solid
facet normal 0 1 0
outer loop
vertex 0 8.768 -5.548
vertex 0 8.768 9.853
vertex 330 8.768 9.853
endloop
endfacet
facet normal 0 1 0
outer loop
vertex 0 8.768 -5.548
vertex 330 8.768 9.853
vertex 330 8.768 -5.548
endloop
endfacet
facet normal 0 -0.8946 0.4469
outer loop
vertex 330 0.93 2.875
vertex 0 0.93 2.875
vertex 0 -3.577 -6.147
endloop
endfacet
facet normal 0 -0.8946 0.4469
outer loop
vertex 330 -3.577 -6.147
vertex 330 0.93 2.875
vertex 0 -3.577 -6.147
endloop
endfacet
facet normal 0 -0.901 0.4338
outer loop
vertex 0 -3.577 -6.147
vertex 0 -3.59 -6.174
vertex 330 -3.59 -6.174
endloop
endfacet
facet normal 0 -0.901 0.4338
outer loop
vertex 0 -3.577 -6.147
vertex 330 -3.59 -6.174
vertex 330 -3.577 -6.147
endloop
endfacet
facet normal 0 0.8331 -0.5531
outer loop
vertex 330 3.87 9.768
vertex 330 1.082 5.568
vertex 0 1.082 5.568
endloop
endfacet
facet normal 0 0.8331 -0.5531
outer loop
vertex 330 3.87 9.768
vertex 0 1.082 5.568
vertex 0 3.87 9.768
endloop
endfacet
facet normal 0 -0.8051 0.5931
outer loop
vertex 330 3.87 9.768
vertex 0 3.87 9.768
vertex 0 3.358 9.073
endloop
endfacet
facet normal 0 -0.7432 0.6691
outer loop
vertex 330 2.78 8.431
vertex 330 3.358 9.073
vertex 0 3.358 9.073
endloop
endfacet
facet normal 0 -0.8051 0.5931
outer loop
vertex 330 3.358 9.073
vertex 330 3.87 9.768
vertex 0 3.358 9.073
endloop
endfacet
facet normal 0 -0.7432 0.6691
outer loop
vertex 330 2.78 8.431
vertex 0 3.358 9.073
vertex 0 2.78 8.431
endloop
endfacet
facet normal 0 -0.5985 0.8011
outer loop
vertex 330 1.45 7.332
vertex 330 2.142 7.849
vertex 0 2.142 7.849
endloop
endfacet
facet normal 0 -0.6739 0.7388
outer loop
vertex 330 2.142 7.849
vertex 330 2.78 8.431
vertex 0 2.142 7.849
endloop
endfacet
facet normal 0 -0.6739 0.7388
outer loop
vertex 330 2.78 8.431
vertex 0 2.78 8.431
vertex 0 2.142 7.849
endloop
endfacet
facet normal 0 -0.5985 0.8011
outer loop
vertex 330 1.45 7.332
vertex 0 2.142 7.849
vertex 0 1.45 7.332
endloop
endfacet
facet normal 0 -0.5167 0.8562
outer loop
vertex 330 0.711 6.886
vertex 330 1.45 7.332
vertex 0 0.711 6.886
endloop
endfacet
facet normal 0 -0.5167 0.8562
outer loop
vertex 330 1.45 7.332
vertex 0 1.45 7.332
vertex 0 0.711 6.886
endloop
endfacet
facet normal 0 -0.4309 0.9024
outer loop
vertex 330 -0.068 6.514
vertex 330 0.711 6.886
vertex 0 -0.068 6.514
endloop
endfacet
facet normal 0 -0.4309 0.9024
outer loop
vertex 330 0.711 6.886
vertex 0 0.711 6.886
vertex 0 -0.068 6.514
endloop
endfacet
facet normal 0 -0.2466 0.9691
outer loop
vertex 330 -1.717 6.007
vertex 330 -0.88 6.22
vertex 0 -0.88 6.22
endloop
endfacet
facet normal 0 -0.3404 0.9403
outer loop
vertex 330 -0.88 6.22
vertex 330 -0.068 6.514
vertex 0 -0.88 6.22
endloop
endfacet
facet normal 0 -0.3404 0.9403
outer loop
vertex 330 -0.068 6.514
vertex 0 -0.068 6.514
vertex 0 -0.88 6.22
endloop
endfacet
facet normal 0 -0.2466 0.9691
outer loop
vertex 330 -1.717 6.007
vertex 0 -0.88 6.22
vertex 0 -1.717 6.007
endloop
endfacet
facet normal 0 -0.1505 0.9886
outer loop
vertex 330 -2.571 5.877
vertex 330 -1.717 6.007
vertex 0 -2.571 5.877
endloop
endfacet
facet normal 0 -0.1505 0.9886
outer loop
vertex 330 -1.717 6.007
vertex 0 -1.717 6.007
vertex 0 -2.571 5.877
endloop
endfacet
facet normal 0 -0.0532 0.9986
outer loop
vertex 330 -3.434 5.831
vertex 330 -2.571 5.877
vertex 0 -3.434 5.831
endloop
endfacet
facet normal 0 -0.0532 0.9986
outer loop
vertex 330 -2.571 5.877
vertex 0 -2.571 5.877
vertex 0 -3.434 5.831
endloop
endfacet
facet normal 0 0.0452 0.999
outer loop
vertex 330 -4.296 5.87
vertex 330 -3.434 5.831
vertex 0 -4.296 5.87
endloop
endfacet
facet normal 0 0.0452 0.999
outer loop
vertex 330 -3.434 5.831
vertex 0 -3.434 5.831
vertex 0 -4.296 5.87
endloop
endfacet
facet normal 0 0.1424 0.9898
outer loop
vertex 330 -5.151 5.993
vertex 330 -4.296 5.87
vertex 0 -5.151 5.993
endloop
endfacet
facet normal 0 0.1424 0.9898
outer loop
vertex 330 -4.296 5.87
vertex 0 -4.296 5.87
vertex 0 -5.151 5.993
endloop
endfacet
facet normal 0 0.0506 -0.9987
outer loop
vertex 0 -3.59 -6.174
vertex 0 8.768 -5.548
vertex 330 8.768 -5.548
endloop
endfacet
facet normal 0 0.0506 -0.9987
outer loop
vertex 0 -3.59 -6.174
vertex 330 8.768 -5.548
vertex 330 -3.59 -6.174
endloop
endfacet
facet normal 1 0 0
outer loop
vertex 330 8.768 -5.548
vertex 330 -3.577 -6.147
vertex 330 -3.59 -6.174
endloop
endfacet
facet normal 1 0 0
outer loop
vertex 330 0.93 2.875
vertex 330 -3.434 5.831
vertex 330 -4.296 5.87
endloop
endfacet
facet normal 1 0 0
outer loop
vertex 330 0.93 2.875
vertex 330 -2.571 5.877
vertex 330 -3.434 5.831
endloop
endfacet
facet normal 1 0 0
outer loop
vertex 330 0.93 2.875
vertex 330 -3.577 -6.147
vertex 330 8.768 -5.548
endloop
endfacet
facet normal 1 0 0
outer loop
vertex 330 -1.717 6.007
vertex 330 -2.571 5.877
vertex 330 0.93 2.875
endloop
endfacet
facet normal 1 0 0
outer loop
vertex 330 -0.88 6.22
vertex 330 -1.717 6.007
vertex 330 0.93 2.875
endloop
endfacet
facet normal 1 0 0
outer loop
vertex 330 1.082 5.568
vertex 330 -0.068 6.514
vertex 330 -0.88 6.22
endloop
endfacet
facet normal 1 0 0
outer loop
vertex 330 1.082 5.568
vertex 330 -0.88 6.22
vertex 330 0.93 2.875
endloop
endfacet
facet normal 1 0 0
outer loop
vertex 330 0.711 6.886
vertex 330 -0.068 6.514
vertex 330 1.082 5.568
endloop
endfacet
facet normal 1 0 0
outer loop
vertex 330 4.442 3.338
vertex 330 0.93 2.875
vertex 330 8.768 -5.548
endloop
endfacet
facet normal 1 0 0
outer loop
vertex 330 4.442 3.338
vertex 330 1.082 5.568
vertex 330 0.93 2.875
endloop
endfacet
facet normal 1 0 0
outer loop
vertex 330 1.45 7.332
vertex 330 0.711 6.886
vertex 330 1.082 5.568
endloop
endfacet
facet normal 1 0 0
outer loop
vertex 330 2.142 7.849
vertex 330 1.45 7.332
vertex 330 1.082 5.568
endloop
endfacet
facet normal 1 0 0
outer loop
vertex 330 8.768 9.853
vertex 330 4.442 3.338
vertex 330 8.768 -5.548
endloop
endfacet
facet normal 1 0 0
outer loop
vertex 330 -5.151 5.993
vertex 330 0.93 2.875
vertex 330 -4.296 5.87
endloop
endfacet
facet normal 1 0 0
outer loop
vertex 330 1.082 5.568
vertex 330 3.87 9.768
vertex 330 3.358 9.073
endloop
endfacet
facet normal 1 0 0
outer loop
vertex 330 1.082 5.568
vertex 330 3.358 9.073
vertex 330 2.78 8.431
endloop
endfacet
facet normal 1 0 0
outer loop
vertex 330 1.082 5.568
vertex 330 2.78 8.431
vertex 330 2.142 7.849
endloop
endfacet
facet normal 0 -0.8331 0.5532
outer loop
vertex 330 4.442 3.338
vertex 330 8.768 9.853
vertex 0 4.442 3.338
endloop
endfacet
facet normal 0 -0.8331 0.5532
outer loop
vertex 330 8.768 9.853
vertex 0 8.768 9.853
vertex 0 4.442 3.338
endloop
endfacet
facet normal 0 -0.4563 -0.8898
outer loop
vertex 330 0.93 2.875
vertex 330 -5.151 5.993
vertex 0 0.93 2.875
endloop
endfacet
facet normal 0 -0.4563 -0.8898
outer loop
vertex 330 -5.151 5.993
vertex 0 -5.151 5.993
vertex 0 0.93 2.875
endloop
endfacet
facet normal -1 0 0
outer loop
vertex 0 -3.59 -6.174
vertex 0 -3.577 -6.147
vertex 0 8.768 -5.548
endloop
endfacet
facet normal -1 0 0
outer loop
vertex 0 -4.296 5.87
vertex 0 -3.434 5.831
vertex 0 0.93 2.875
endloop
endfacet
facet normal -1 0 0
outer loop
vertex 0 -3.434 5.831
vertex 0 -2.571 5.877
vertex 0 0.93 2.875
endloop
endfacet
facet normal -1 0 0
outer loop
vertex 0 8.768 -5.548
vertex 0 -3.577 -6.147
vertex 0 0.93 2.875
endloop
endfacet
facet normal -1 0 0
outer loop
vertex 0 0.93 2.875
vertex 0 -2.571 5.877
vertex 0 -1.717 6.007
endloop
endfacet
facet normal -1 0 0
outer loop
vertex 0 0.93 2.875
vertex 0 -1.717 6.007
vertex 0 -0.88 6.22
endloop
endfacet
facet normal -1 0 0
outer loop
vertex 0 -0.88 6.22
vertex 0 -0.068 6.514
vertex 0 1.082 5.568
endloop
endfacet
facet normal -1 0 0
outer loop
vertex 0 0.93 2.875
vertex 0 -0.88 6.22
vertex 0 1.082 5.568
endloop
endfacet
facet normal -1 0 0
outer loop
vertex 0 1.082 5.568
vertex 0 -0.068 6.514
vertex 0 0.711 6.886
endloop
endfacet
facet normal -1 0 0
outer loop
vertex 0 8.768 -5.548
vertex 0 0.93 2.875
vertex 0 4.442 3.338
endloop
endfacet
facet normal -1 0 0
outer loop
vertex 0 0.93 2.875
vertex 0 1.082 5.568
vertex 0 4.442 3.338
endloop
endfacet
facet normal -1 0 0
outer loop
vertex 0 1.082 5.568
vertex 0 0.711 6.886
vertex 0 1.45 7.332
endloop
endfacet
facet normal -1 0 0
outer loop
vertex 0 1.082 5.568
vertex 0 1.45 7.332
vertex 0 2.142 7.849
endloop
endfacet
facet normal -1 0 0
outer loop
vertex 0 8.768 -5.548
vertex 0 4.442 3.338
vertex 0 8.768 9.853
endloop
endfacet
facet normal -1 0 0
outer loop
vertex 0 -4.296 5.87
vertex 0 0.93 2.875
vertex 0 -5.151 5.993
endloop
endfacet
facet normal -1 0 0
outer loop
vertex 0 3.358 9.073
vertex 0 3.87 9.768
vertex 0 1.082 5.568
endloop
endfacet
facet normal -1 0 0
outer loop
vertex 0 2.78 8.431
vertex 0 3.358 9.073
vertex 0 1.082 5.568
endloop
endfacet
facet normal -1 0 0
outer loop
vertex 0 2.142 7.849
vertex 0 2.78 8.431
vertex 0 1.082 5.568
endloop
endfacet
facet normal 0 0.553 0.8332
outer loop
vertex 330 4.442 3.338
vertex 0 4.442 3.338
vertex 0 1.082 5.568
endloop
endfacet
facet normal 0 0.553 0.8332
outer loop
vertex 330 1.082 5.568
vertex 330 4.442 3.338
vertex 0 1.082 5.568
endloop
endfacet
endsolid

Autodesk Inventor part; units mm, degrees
ref_plane "YZ Plane" through (0, 0, 0) normal (1, 0, 0) x (0, 1, 0)
ref_plane "XZ Plane" through (0, 0, 0) normal (0, 1, 0) x (-1, 0, 0)
ref_plane "XY Plane" through (0, 0, 0) normal (0, 0, 1) x (1, 0, 0)
sketch "Esboço1" plane through (0, 0, 0) normal (1, 0, 0) x (0, 1, 0)
  line L0 (8.7685, 9.8534) -> (4.4419, 3.3376)
  line L1 (4.4419, 3.3376) -> (1.0821, 5.5685)
  line L2 (1.0821, 5.5685) -> (3.8705, 9.768)
  line L3 (-5.1511, 5.9928) -> (0.9304, 2.875)
  line L4 (0.9304, 2.875) -> (-3.5768, -6.1466)
  line L5 (8.7685, 9.8534) -> (8.7685, -5.5484)
  line L6 (8.7685, -5.5484) -> (-3.5905, -6.174)
  line L7 (-3.5905, -6.174) -> (-3.5768, -6.1466)
  arc A0 (-5.1511, 5.9928) -> (3.8705, 9.768) centre (-3.4697, 14.6419) ccw
extrude "Extrusão1" add sketch "Esboço1" along normal blind 330
properties part number "juncao tela - som"
